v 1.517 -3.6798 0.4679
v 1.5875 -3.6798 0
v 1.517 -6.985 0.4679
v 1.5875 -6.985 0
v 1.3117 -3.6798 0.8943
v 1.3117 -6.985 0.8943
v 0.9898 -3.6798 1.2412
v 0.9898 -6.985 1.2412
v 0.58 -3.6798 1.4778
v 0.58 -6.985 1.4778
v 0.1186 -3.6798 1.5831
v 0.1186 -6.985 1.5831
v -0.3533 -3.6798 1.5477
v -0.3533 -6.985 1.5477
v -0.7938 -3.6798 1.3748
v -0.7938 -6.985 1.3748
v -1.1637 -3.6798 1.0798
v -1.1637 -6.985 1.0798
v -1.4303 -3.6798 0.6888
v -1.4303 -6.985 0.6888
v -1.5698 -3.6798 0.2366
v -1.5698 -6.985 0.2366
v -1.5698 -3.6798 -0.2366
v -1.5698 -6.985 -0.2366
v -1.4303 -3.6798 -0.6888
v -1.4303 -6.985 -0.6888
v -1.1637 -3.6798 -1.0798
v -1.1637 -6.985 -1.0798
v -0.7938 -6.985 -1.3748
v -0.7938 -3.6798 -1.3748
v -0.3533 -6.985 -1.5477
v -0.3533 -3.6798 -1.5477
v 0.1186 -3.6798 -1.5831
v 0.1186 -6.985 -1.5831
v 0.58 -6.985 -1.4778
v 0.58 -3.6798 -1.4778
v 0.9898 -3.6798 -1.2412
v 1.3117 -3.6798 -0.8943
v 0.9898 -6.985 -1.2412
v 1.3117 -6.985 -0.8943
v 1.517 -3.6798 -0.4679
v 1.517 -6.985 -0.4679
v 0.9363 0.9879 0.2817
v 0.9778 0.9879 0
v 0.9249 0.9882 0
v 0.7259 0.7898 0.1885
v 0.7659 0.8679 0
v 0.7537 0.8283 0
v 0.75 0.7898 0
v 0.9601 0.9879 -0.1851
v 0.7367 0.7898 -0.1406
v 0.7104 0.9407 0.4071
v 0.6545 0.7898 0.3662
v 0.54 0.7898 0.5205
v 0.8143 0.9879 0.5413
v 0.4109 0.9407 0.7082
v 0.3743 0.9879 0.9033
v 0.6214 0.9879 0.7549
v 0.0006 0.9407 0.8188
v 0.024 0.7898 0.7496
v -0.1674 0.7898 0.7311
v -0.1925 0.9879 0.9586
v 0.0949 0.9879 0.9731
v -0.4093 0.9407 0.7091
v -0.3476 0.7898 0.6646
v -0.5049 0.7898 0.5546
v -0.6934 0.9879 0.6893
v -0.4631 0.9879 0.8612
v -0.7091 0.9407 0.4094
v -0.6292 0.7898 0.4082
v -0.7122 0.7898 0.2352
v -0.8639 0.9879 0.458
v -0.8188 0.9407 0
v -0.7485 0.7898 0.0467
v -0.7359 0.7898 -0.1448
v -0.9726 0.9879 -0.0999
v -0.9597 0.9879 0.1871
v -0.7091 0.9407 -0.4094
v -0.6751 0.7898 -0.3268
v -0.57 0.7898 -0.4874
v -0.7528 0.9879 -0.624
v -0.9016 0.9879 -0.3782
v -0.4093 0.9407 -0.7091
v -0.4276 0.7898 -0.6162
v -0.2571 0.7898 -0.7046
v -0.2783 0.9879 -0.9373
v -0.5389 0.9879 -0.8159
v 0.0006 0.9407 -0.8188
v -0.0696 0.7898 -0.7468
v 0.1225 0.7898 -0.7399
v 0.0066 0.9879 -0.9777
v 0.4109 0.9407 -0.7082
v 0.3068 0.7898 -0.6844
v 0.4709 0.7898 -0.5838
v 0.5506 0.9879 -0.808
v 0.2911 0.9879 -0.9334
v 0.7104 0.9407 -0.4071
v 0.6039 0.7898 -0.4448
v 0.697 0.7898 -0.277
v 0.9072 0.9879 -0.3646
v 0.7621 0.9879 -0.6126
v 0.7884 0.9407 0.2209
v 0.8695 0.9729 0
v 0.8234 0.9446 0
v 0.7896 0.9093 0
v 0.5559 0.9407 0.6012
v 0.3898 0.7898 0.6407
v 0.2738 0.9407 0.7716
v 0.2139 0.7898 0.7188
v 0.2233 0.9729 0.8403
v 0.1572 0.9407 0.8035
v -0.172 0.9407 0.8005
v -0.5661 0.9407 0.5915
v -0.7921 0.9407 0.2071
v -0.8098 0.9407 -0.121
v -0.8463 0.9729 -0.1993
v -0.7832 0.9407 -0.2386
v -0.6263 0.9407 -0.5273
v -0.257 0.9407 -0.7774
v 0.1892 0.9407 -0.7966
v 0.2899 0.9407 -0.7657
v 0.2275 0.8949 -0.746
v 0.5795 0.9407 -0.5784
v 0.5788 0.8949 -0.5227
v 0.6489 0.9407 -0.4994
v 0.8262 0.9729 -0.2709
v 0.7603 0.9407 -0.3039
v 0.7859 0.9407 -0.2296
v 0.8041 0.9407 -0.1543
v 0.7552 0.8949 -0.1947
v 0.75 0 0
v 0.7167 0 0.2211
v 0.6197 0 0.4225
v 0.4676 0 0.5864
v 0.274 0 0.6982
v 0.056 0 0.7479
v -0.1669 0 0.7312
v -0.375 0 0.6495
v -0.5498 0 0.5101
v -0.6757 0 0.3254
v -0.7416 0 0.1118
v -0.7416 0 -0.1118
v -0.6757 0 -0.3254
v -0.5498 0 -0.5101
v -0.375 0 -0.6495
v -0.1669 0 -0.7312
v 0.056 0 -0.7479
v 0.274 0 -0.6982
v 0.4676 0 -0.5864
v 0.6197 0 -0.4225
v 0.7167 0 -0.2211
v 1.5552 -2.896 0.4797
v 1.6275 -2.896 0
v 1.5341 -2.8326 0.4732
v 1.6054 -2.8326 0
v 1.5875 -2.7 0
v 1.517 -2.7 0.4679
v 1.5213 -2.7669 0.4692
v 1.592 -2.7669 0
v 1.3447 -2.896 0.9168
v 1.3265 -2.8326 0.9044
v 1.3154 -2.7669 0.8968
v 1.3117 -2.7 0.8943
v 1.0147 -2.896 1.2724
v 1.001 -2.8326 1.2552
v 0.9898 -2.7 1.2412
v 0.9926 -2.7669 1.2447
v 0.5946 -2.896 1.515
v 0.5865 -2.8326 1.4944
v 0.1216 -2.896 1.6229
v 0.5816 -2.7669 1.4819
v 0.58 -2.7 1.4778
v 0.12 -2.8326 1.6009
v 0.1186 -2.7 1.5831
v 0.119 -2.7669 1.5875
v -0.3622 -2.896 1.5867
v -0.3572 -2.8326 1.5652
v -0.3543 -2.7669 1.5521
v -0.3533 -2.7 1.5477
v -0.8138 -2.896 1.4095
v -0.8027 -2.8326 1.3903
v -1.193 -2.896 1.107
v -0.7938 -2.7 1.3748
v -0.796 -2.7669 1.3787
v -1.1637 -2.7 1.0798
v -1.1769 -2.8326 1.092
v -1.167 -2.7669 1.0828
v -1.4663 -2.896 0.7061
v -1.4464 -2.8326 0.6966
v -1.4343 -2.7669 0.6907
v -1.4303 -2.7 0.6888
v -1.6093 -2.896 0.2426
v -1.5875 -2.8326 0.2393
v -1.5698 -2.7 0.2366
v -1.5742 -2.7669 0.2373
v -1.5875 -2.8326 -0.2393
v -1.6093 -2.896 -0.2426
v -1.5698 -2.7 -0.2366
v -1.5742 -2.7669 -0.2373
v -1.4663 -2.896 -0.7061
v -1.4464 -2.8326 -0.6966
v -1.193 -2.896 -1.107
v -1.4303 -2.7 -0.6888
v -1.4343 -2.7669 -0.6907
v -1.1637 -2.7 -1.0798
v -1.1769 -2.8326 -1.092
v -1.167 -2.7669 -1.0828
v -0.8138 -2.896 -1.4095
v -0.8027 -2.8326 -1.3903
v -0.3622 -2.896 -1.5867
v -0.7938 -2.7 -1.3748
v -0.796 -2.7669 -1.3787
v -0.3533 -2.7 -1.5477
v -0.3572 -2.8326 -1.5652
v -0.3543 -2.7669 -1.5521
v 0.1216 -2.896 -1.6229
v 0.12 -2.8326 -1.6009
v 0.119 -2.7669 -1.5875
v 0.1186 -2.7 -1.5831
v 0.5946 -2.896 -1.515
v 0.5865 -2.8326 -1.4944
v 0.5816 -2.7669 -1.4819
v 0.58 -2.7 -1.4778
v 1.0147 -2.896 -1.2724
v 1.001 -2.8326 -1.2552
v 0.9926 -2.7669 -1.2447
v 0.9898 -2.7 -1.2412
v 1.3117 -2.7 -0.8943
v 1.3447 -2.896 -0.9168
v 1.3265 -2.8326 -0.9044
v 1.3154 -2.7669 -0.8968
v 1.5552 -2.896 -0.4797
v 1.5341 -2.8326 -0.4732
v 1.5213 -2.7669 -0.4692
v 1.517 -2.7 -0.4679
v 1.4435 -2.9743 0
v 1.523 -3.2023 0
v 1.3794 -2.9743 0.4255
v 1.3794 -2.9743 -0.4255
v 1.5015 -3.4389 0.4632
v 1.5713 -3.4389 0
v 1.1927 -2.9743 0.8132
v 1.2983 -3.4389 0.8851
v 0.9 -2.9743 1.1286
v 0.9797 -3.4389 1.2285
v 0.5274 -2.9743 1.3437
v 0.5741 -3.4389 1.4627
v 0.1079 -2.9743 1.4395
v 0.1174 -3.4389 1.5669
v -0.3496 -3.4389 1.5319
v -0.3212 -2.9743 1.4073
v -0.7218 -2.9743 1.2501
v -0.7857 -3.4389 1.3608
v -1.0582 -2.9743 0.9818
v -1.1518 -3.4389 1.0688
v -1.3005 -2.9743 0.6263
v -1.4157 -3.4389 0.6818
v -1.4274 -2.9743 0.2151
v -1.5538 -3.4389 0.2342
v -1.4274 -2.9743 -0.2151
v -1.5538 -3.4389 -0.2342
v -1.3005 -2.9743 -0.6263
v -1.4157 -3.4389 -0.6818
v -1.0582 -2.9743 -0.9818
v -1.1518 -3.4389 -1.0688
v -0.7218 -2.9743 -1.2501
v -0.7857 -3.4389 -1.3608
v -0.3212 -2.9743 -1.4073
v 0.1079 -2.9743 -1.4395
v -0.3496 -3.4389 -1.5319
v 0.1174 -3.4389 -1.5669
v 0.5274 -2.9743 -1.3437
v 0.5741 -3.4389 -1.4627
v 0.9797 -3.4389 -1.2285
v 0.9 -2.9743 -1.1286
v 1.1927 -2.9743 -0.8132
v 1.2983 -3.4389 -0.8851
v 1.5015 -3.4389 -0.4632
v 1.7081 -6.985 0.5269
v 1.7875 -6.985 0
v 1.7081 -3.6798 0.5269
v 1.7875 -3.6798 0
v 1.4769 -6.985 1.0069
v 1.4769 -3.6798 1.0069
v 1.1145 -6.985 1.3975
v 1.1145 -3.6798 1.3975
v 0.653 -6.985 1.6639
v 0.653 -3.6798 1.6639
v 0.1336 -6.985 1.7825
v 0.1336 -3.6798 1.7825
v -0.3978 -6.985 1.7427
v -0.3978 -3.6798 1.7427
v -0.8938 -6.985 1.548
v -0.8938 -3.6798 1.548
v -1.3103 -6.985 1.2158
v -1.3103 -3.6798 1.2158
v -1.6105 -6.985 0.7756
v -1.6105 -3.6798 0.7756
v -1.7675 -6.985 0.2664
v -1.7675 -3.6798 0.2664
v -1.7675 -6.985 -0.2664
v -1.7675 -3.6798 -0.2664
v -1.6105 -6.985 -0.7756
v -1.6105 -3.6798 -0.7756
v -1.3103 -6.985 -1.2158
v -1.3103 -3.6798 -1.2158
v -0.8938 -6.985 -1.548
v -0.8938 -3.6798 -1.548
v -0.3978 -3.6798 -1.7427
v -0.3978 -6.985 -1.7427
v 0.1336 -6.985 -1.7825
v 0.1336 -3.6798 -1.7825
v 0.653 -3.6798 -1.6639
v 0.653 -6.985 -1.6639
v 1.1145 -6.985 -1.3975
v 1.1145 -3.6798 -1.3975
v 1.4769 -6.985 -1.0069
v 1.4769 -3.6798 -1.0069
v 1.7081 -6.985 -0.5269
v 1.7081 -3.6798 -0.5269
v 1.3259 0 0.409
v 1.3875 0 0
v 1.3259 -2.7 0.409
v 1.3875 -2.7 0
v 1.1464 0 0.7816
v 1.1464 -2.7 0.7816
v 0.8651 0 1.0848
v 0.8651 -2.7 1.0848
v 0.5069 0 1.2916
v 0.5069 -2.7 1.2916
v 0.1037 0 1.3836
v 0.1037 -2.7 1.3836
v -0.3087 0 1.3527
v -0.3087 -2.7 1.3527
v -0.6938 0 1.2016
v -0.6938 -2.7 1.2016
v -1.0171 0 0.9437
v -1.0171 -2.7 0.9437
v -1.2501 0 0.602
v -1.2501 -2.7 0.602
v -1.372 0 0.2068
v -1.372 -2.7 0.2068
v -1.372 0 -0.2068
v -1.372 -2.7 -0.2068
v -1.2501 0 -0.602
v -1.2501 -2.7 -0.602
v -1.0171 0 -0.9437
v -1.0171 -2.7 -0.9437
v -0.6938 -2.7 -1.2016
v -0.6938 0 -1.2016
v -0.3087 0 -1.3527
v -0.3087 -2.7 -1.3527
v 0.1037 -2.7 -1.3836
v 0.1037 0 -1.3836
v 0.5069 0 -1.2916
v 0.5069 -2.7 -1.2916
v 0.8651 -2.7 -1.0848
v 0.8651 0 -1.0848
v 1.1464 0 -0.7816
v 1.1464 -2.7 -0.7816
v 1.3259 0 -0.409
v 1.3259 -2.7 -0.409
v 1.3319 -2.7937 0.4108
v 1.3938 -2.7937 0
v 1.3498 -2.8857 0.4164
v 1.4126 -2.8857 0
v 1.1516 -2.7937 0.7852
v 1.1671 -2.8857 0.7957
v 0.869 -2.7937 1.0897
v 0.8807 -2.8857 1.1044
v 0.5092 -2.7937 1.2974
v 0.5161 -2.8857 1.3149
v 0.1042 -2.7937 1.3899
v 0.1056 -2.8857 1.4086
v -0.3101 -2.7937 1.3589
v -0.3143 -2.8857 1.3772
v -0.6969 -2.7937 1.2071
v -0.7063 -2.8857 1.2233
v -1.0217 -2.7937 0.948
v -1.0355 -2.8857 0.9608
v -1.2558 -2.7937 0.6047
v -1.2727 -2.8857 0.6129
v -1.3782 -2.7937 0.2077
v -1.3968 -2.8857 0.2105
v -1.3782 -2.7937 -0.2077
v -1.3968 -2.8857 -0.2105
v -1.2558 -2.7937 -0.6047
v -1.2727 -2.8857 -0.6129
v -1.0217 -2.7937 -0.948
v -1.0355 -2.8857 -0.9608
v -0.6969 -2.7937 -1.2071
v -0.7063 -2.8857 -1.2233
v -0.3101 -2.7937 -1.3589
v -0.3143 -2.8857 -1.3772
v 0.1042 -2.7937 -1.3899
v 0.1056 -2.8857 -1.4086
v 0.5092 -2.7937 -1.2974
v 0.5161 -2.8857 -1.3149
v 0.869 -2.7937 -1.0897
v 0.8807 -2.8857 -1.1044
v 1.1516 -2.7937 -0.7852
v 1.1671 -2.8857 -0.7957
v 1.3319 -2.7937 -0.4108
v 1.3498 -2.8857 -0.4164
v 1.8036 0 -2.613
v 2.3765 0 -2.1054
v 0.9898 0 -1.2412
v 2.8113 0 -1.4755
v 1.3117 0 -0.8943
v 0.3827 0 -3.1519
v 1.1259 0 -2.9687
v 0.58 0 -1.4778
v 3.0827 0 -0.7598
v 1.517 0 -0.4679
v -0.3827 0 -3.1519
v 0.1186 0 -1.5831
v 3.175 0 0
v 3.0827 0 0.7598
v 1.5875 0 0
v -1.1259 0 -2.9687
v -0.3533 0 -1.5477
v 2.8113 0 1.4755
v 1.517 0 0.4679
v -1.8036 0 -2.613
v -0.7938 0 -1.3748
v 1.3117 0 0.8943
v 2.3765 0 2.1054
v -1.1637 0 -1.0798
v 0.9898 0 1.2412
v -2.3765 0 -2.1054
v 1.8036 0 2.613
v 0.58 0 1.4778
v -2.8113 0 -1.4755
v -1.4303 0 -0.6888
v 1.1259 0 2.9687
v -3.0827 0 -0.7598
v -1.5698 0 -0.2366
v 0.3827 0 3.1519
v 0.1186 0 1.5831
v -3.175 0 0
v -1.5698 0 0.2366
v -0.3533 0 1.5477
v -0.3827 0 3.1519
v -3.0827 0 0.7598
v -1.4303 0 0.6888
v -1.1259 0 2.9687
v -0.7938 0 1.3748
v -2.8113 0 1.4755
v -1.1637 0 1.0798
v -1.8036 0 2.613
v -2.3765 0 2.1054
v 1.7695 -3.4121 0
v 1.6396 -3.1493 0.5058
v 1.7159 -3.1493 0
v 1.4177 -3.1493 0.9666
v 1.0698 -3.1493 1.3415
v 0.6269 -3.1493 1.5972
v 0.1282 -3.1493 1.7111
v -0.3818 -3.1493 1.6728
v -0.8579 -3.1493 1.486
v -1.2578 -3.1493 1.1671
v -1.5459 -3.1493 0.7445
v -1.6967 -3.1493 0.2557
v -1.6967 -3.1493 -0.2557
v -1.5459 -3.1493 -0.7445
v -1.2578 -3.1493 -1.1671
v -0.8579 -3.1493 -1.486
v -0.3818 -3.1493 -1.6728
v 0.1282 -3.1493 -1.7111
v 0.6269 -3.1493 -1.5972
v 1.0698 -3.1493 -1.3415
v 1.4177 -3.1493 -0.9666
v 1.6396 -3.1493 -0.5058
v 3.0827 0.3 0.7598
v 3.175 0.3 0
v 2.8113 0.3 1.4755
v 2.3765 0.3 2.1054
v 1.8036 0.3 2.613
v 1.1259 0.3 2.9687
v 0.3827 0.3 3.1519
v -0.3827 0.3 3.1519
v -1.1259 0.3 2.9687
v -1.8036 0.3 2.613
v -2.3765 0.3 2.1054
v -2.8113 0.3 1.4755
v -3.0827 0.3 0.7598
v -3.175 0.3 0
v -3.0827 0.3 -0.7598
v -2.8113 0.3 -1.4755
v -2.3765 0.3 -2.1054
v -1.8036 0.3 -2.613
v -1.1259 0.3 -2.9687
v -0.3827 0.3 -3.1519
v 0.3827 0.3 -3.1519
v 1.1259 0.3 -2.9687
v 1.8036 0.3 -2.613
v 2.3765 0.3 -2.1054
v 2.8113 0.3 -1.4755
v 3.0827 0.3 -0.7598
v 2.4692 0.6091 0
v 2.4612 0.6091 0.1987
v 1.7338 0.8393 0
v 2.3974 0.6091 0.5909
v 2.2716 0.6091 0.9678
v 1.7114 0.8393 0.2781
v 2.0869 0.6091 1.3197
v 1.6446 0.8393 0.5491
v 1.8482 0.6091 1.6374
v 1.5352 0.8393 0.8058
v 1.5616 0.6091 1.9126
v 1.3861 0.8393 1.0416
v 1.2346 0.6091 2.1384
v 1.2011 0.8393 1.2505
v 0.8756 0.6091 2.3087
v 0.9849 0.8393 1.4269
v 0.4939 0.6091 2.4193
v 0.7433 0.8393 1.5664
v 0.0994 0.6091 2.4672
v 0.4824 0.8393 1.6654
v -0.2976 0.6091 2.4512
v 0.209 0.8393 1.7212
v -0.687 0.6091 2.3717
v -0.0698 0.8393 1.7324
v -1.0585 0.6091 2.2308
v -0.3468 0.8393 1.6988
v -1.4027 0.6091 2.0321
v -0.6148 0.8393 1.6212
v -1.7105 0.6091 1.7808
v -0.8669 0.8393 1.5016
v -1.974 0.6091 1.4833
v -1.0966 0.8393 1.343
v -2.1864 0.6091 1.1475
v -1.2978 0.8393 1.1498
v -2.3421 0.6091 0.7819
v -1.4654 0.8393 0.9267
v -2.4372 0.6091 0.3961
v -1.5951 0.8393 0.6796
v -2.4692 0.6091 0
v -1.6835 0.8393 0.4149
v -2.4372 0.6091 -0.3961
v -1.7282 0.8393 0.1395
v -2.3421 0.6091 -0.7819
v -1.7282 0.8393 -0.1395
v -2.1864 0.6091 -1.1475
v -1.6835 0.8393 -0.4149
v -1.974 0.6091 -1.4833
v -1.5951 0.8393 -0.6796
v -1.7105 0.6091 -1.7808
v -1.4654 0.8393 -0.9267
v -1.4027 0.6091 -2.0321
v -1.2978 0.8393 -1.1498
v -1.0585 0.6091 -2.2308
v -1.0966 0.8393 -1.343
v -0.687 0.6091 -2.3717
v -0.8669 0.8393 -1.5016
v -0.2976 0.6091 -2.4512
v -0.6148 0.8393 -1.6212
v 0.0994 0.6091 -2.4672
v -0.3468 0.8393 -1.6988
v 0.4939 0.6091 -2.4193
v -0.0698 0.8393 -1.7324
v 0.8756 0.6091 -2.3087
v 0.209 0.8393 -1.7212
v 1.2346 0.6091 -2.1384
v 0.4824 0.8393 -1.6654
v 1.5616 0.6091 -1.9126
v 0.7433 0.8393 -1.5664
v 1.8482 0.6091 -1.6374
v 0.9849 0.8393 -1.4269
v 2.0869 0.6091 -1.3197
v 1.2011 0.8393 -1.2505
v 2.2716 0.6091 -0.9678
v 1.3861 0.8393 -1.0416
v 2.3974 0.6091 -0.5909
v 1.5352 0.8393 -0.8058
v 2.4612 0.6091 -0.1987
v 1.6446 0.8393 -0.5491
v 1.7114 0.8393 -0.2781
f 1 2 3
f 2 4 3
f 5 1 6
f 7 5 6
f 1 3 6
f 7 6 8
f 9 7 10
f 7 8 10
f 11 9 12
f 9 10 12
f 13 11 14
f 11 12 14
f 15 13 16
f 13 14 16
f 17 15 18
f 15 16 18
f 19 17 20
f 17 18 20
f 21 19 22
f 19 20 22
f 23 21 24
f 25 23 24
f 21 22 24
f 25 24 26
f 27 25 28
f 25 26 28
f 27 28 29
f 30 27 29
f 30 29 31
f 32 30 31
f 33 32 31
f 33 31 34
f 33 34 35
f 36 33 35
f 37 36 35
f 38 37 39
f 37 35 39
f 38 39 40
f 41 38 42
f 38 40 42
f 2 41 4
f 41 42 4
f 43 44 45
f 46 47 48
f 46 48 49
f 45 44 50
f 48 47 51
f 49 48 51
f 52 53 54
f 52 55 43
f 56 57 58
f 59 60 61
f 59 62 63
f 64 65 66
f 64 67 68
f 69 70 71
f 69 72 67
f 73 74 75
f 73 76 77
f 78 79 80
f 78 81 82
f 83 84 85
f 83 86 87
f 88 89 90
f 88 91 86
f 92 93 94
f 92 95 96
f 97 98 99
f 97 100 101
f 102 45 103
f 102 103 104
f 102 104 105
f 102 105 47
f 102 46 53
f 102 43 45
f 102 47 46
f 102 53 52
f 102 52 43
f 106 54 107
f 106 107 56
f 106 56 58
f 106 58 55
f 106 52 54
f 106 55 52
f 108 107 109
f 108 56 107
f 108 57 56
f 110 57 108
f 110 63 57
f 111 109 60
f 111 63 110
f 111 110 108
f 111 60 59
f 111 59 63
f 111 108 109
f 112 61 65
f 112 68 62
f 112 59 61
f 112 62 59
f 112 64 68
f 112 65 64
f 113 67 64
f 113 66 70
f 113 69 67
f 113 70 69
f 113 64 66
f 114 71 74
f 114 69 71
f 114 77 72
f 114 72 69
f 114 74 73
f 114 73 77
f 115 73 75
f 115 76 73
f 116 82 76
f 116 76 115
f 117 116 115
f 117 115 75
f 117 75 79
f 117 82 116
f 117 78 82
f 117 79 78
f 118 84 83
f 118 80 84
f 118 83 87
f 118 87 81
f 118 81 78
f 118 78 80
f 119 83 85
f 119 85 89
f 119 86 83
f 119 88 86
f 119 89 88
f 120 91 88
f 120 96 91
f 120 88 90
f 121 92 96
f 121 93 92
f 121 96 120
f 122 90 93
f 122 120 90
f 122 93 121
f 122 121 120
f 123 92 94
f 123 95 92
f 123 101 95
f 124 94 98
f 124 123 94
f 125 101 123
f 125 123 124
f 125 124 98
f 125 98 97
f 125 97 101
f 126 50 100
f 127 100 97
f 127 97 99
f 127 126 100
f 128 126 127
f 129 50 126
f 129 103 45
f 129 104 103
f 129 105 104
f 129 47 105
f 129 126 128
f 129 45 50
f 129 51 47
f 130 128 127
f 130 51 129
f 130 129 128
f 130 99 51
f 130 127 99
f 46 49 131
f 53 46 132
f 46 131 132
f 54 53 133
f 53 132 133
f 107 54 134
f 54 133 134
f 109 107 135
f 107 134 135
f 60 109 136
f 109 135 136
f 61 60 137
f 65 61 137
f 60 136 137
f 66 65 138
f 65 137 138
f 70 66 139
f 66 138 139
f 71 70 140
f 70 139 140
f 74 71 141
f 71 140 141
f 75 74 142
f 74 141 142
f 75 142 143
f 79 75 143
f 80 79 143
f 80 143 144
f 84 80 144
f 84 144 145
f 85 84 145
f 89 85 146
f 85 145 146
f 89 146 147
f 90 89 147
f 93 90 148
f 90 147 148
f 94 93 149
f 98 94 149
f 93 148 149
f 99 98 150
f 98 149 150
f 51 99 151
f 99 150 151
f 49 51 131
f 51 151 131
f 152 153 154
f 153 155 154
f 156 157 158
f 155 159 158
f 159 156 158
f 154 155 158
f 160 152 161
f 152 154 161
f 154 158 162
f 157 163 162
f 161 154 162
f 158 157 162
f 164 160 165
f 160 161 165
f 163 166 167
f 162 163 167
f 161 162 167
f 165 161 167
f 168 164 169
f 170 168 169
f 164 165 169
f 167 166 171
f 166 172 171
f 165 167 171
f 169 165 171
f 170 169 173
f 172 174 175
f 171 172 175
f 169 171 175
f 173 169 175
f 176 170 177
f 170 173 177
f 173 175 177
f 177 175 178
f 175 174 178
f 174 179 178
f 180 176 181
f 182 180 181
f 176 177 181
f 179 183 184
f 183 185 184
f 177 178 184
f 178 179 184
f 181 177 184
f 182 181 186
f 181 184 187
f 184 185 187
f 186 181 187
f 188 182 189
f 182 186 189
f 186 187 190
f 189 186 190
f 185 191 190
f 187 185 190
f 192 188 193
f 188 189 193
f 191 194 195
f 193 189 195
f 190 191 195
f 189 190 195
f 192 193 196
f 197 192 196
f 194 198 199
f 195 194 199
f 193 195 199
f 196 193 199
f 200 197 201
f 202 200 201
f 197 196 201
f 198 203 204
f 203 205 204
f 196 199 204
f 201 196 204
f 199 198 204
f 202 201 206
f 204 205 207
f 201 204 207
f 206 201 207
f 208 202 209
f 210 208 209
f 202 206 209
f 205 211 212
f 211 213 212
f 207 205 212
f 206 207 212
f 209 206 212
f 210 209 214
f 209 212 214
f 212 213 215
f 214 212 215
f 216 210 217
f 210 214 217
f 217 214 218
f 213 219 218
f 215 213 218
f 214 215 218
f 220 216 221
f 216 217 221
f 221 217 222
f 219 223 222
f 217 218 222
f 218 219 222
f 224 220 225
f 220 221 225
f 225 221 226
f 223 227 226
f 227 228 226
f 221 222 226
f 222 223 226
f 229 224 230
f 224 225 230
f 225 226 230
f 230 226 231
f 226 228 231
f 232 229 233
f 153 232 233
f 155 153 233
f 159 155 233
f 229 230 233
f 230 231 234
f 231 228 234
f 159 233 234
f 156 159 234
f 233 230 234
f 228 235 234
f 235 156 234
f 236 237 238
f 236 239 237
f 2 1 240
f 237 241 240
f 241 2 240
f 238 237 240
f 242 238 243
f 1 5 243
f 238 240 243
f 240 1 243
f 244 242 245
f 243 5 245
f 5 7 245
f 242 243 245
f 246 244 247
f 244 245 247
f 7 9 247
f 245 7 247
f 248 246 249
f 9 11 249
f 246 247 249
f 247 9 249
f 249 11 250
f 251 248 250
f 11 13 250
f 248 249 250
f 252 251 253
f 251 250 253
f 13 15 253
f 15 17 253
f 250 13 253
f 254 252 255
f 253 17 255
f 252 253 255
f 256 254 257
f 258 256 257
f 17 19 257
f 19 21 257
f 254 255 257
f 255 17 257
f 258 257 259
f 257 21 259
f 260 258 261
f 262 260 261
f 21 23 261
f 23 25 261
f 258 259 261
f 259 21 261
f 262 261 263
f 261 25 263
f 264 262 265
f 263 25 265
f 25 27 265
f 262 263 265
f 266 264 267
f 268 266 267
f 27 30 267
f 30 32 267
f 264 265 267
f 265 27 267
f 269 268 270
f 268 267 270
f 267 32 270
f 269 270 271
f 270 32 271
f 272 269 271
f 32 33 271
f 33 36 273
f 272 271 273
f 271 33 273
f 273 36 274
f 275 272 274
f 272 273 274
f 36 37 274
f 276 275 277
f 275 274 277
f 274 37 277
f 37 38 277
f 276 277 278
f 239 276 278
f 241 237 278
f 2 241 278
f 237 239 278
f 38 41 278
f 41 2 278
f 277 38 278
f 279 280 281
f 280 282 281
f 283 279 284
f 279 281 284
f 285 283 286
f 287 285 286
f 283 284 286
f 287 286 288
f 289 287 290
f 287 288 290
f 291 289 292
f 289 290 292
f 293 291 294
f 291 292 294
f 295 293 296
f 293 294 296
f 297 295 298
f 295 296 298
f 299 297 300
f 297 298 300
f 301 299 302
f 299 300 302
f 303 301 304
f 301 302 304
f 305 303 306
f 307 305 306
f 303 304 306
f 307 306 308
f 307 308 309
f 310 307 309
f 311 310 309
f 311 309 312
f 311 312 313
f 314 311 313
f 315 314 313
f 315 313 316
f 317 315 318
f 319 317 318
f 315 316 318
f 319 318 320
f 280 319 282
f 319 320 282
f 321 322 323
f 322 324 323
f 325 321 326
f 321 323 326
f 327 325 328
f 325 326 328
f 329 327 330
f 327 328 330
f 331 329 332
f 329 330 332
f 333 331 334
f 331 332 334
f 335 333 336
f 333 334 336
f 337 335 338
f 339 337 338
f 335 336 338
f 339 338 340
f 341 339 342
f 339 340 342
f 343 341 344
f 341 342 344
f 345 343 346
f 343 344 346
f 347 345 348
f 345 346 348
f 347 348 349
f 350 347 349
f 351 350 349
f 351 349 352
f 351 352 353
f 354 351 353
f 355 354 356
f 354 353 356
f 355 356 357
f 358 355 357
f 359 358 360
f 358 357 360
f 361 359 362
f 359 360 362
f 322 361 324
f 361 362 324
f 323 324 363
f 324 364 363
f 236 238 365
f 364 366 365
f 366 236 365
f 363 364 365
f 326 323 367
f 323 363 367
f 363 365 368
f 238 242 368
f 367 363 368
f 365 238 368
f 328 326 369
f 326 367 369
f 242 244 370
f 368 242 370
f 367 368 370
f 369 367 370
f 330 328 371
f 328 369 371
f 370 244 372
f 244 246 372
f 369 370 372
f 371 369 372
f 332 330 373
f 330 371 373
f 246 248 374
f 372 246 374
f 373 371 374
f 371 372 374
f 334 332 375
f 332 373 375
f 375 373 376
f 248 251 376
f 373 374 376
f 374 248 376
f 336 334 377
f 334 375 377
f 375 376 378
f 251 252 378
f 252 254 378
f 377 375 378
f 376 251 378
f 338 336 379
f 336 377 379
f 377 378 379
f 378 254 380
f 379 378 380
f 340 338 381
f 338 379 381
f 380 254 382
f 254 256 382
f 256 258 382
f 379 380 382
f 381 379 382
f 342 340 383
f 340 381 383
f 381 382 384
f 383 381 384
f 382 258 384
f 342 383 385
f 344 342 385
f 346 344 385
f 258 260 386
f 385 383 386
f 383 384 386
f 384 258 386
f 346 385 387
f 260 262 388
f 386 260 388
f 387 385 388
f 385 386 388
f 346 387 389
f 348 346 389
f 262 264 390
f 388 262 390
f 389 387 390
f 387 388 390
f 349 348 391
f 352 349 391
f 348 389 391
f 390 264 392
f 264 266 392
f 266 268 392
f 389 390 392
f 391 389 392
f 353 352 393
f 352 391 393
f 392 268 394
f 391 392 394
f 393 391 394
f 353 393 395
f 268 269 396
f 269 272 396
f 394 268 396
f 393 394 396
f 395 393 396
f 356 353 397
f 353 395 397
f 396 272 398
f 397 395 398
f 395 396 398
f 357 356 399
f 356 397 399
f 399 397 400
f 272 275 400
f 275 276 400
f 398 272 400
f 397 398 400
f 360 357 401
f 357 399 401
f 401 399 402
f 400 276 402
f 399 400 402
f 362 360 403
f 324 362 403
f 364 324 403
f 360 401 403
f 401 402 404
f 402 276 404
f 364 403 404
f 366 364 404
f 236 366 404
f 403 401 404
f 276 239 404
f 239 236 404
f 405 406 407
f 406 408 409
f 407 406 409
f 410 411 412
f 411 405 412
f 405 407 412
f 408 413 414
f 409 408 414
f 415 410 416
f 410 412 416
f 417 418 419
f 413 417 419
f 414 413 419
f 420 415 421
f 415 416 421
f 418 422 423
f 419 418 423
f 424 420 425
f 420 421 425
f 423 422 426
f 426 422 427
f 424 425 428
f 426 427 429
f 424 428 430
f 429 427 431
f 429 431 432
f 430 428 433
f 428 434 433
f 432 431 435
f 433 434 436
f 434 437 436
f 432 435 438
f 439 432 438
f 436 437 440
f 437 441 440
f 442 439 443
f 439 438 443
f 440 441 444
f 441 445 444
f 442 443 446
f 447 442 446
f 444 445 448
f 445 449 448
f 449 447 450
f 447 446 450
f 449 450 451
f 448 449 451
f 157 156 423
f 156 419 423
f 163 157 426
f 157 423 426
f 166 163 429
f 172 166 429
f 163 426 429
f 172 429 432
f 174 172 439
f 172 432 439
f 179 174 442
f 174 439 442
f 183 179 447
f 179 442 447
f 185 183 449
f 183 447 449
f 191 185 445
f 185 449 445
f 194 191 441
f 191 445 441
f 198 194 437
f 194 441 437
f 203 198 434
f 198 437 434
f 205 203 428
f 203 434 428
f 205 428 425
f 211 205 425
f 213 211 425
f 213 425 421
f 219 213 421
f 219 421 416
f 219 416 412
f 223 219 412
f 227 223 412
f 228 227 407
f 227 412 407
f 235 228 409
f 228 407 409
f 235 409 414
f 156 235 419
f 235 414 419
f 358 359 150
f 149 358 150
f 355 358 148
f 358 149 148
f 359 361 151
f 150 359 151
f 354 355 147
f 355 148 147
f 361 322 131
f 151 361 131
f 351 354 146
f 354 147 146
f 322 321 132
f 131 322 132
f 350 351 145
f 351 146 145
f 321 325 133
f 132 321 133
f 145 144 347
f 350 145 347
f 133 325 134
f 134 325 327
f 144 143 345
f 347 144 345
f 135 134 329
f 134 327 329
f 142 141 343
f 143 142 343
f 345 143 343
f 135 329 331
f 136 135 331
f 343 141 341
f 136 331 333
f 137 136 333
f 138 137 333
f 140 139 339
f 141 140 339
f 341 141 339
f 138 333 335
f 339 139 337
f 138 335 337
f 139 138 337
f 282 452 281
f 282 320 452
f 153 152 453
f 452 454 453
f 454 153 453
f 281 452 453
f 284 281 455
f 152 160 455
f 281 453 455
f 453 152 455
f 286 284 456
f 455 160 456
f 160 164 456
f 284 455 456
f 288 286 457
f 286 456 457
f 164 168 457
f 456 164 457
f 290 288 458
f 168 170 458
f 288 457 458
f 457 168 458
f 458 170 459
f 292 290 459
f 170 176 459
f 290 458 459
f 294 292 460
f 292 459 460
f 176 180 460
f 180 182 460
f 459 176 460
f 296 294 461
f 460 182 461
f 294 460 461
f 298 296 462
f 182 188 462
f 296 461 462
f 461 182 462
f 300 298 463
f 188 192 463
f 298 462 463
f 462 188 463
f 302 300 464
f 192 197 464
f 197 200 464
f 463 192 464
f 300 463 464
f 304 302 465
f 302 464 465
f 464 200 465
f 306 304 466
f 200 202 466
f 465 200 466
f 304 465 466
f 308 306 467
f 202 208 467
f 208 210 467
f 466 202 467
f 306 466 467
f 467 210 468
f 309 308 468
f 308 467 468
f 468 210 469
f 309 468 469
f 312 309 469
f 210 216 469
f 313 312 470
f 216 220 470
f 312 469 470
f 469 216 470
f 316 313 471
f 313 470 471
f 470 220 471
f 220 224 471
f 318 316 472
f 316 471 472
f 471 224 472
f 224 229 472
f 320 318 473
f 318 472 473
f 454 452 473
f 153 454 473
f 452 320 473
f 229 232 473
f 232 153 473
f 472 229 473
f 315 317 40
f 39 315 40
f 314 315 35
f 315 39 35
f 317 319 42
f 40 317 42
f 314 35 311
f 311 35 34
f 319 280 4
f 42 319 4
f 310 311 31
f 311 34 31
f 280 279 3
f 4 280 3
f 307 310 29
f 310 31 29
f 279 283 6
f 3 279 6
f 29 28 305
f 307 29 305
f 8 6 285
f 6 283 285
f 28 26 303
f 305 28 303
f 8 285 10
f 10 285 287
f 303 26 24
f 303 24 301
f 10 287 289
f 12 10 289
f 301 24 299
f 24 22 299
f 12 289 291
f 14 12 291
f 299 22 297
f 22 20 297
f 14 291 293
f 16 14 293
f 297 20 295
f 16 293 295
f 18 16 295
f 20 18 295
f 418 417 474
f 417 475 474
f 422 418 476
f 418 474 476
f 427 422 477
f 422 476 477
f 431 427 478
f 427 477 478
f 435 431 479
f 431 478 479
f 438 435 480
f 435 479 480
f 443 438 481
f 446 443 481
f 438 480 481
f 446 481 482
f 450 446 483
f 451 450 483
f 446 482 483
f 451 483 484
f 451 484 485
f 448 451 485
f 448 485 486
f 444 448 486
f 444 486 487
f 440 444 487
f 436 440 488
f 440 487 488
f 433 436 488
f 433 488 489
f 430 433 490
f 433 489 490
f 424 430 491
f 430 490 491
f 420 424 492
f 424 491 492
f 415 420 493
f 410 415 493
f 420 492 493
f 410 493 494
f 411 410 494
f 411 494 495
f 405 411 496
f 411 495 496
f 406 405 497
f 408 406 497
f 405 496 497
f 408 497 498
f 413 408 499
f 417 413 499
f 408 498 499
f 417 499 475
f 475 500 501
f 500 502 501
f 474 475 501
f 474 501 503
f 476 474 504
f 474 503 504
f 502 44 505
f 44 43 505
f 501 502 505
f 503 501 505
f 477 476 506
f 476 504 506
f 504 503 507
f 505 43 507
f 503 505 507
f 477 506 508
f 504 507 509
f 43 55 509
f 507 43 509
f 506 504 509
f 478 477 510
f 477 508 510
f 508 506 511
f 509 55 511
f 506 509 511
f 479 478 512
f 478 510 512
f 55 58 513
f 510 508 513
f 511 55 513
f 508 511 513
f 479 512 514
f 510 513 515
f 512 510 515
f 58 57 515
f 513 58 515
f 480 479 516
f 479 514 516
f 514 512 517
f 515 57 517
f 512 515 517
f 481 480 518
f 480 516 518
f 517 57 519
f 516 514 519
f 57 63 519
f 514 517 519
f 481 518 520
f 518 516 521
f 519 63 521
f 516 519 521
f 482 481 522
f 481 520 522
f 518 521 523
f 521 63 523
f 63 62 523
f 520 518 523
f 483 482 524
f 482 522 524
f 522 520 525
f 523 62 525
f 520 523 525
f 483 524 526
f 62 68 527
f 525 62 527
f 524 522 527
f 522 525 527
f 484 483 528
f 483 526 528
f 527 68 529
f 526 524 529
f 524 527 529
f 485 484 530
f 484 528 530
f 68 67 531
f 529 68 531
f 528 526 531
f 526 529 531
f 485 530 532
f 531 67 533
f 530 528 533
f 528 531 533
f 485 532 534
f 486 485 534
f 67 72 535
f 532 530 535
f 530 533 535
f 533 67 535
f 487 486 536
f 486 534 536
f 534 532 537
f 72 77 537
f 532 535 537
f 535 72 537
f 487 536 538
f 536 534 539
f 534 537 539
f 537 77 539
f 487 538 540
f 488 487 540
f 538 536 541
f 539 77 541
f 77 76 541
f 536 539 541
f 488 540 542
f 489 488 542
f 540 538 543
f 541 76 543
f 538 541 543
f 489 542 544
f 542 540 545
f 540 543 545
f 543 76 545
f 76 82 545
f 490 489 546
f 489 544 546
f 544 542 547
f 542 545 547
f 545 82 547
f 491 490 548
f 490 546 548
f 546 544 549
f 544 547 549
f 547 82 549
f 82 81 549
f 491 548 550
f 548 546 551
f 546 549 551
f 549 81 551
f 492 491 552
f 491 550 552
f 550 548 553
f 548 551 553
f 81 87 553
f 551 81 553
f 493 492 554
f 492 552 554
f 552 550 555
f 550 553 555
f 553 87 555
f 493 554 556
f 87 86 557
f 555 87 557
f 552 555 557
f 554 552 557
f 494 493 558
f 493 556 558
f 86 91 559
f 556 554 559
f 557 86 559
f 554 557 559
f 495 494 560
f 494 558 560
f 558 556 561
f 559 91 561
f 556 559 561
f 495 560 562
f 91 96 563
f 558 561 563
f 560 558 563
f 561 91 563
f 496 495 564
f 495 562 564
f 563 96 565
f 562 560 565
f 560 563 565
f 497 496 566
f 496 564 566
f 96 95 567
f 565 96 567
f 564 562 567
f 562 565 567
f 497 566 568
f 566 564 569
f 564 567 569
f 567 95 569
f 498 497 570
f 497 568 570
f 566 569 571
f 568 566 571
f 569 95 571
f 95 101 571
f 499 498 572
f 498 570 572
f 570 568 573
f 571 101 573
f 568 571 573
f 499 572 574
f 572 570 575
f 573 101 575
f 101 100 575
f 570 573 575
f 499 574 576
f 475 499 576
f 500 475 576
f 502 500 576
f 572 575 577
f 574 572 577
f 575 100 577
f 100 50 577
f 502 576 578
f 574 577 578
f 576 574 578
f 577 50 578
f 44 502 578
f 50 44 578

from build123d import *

# Parameters (mm, degrees)
FILLET1_R = 0.2


with BuildPart() as part:
    # Sketch1 → Revolve1 (revolve)
    with BuildSketch(Plane.XY):
        with BuildLine():
            Line((1.5875, -3.679795897), (1.5875, -6.985))
            Line((1.5875, -6.985), (1.7875, -6.985))
            Line((1.7875, -6.985), (1.7875, -3.679795897))
            ThreePointArc((1.7875, -3.679795897), (1.747091794, -3.279795897), (1.6275, -2.895959179))
            ThreePointArc((1.6275, -2.895959179), (1.597602051, -2.8), (1.5875, -2.7))
            Line((1.5875, -2.7), (1.5875, 0))
            Line((1.5875, 0), (3.175, 0))
            Line((3.175, 0), (3.175, 0.3))
            ThreePointArc((3.175, 0.3), (1.994886024, 0.767687303), (0.75, 1.016))
            Line((0.75, 1.016), (0.75, 0))
            Line((0.75, 0), (1.3875, 0))
            Line((1.3875, 0), (1.3875, -2.7))
            ThreePointArc((1.3875, -2.7), (1.401642872, -2.84), (1.4435, -2.974342851))
            ThreePointArc((1.4435, -2.974342851), (1.551132615, -3.319795897), (1.5875, -3.679795897))
        make_face()
    revolve(axis=Axis((0, 1.016, 0), (0, -1, 0)))

    # Fillet1
    fillet1_edges = [part.edges().sort_by_distance(p)[0] for p in [
        (-0.75, 1.016, 0),
    ]]
    fillet(fillet1_edges, radius=FILLET1_R)


solid = part.part
